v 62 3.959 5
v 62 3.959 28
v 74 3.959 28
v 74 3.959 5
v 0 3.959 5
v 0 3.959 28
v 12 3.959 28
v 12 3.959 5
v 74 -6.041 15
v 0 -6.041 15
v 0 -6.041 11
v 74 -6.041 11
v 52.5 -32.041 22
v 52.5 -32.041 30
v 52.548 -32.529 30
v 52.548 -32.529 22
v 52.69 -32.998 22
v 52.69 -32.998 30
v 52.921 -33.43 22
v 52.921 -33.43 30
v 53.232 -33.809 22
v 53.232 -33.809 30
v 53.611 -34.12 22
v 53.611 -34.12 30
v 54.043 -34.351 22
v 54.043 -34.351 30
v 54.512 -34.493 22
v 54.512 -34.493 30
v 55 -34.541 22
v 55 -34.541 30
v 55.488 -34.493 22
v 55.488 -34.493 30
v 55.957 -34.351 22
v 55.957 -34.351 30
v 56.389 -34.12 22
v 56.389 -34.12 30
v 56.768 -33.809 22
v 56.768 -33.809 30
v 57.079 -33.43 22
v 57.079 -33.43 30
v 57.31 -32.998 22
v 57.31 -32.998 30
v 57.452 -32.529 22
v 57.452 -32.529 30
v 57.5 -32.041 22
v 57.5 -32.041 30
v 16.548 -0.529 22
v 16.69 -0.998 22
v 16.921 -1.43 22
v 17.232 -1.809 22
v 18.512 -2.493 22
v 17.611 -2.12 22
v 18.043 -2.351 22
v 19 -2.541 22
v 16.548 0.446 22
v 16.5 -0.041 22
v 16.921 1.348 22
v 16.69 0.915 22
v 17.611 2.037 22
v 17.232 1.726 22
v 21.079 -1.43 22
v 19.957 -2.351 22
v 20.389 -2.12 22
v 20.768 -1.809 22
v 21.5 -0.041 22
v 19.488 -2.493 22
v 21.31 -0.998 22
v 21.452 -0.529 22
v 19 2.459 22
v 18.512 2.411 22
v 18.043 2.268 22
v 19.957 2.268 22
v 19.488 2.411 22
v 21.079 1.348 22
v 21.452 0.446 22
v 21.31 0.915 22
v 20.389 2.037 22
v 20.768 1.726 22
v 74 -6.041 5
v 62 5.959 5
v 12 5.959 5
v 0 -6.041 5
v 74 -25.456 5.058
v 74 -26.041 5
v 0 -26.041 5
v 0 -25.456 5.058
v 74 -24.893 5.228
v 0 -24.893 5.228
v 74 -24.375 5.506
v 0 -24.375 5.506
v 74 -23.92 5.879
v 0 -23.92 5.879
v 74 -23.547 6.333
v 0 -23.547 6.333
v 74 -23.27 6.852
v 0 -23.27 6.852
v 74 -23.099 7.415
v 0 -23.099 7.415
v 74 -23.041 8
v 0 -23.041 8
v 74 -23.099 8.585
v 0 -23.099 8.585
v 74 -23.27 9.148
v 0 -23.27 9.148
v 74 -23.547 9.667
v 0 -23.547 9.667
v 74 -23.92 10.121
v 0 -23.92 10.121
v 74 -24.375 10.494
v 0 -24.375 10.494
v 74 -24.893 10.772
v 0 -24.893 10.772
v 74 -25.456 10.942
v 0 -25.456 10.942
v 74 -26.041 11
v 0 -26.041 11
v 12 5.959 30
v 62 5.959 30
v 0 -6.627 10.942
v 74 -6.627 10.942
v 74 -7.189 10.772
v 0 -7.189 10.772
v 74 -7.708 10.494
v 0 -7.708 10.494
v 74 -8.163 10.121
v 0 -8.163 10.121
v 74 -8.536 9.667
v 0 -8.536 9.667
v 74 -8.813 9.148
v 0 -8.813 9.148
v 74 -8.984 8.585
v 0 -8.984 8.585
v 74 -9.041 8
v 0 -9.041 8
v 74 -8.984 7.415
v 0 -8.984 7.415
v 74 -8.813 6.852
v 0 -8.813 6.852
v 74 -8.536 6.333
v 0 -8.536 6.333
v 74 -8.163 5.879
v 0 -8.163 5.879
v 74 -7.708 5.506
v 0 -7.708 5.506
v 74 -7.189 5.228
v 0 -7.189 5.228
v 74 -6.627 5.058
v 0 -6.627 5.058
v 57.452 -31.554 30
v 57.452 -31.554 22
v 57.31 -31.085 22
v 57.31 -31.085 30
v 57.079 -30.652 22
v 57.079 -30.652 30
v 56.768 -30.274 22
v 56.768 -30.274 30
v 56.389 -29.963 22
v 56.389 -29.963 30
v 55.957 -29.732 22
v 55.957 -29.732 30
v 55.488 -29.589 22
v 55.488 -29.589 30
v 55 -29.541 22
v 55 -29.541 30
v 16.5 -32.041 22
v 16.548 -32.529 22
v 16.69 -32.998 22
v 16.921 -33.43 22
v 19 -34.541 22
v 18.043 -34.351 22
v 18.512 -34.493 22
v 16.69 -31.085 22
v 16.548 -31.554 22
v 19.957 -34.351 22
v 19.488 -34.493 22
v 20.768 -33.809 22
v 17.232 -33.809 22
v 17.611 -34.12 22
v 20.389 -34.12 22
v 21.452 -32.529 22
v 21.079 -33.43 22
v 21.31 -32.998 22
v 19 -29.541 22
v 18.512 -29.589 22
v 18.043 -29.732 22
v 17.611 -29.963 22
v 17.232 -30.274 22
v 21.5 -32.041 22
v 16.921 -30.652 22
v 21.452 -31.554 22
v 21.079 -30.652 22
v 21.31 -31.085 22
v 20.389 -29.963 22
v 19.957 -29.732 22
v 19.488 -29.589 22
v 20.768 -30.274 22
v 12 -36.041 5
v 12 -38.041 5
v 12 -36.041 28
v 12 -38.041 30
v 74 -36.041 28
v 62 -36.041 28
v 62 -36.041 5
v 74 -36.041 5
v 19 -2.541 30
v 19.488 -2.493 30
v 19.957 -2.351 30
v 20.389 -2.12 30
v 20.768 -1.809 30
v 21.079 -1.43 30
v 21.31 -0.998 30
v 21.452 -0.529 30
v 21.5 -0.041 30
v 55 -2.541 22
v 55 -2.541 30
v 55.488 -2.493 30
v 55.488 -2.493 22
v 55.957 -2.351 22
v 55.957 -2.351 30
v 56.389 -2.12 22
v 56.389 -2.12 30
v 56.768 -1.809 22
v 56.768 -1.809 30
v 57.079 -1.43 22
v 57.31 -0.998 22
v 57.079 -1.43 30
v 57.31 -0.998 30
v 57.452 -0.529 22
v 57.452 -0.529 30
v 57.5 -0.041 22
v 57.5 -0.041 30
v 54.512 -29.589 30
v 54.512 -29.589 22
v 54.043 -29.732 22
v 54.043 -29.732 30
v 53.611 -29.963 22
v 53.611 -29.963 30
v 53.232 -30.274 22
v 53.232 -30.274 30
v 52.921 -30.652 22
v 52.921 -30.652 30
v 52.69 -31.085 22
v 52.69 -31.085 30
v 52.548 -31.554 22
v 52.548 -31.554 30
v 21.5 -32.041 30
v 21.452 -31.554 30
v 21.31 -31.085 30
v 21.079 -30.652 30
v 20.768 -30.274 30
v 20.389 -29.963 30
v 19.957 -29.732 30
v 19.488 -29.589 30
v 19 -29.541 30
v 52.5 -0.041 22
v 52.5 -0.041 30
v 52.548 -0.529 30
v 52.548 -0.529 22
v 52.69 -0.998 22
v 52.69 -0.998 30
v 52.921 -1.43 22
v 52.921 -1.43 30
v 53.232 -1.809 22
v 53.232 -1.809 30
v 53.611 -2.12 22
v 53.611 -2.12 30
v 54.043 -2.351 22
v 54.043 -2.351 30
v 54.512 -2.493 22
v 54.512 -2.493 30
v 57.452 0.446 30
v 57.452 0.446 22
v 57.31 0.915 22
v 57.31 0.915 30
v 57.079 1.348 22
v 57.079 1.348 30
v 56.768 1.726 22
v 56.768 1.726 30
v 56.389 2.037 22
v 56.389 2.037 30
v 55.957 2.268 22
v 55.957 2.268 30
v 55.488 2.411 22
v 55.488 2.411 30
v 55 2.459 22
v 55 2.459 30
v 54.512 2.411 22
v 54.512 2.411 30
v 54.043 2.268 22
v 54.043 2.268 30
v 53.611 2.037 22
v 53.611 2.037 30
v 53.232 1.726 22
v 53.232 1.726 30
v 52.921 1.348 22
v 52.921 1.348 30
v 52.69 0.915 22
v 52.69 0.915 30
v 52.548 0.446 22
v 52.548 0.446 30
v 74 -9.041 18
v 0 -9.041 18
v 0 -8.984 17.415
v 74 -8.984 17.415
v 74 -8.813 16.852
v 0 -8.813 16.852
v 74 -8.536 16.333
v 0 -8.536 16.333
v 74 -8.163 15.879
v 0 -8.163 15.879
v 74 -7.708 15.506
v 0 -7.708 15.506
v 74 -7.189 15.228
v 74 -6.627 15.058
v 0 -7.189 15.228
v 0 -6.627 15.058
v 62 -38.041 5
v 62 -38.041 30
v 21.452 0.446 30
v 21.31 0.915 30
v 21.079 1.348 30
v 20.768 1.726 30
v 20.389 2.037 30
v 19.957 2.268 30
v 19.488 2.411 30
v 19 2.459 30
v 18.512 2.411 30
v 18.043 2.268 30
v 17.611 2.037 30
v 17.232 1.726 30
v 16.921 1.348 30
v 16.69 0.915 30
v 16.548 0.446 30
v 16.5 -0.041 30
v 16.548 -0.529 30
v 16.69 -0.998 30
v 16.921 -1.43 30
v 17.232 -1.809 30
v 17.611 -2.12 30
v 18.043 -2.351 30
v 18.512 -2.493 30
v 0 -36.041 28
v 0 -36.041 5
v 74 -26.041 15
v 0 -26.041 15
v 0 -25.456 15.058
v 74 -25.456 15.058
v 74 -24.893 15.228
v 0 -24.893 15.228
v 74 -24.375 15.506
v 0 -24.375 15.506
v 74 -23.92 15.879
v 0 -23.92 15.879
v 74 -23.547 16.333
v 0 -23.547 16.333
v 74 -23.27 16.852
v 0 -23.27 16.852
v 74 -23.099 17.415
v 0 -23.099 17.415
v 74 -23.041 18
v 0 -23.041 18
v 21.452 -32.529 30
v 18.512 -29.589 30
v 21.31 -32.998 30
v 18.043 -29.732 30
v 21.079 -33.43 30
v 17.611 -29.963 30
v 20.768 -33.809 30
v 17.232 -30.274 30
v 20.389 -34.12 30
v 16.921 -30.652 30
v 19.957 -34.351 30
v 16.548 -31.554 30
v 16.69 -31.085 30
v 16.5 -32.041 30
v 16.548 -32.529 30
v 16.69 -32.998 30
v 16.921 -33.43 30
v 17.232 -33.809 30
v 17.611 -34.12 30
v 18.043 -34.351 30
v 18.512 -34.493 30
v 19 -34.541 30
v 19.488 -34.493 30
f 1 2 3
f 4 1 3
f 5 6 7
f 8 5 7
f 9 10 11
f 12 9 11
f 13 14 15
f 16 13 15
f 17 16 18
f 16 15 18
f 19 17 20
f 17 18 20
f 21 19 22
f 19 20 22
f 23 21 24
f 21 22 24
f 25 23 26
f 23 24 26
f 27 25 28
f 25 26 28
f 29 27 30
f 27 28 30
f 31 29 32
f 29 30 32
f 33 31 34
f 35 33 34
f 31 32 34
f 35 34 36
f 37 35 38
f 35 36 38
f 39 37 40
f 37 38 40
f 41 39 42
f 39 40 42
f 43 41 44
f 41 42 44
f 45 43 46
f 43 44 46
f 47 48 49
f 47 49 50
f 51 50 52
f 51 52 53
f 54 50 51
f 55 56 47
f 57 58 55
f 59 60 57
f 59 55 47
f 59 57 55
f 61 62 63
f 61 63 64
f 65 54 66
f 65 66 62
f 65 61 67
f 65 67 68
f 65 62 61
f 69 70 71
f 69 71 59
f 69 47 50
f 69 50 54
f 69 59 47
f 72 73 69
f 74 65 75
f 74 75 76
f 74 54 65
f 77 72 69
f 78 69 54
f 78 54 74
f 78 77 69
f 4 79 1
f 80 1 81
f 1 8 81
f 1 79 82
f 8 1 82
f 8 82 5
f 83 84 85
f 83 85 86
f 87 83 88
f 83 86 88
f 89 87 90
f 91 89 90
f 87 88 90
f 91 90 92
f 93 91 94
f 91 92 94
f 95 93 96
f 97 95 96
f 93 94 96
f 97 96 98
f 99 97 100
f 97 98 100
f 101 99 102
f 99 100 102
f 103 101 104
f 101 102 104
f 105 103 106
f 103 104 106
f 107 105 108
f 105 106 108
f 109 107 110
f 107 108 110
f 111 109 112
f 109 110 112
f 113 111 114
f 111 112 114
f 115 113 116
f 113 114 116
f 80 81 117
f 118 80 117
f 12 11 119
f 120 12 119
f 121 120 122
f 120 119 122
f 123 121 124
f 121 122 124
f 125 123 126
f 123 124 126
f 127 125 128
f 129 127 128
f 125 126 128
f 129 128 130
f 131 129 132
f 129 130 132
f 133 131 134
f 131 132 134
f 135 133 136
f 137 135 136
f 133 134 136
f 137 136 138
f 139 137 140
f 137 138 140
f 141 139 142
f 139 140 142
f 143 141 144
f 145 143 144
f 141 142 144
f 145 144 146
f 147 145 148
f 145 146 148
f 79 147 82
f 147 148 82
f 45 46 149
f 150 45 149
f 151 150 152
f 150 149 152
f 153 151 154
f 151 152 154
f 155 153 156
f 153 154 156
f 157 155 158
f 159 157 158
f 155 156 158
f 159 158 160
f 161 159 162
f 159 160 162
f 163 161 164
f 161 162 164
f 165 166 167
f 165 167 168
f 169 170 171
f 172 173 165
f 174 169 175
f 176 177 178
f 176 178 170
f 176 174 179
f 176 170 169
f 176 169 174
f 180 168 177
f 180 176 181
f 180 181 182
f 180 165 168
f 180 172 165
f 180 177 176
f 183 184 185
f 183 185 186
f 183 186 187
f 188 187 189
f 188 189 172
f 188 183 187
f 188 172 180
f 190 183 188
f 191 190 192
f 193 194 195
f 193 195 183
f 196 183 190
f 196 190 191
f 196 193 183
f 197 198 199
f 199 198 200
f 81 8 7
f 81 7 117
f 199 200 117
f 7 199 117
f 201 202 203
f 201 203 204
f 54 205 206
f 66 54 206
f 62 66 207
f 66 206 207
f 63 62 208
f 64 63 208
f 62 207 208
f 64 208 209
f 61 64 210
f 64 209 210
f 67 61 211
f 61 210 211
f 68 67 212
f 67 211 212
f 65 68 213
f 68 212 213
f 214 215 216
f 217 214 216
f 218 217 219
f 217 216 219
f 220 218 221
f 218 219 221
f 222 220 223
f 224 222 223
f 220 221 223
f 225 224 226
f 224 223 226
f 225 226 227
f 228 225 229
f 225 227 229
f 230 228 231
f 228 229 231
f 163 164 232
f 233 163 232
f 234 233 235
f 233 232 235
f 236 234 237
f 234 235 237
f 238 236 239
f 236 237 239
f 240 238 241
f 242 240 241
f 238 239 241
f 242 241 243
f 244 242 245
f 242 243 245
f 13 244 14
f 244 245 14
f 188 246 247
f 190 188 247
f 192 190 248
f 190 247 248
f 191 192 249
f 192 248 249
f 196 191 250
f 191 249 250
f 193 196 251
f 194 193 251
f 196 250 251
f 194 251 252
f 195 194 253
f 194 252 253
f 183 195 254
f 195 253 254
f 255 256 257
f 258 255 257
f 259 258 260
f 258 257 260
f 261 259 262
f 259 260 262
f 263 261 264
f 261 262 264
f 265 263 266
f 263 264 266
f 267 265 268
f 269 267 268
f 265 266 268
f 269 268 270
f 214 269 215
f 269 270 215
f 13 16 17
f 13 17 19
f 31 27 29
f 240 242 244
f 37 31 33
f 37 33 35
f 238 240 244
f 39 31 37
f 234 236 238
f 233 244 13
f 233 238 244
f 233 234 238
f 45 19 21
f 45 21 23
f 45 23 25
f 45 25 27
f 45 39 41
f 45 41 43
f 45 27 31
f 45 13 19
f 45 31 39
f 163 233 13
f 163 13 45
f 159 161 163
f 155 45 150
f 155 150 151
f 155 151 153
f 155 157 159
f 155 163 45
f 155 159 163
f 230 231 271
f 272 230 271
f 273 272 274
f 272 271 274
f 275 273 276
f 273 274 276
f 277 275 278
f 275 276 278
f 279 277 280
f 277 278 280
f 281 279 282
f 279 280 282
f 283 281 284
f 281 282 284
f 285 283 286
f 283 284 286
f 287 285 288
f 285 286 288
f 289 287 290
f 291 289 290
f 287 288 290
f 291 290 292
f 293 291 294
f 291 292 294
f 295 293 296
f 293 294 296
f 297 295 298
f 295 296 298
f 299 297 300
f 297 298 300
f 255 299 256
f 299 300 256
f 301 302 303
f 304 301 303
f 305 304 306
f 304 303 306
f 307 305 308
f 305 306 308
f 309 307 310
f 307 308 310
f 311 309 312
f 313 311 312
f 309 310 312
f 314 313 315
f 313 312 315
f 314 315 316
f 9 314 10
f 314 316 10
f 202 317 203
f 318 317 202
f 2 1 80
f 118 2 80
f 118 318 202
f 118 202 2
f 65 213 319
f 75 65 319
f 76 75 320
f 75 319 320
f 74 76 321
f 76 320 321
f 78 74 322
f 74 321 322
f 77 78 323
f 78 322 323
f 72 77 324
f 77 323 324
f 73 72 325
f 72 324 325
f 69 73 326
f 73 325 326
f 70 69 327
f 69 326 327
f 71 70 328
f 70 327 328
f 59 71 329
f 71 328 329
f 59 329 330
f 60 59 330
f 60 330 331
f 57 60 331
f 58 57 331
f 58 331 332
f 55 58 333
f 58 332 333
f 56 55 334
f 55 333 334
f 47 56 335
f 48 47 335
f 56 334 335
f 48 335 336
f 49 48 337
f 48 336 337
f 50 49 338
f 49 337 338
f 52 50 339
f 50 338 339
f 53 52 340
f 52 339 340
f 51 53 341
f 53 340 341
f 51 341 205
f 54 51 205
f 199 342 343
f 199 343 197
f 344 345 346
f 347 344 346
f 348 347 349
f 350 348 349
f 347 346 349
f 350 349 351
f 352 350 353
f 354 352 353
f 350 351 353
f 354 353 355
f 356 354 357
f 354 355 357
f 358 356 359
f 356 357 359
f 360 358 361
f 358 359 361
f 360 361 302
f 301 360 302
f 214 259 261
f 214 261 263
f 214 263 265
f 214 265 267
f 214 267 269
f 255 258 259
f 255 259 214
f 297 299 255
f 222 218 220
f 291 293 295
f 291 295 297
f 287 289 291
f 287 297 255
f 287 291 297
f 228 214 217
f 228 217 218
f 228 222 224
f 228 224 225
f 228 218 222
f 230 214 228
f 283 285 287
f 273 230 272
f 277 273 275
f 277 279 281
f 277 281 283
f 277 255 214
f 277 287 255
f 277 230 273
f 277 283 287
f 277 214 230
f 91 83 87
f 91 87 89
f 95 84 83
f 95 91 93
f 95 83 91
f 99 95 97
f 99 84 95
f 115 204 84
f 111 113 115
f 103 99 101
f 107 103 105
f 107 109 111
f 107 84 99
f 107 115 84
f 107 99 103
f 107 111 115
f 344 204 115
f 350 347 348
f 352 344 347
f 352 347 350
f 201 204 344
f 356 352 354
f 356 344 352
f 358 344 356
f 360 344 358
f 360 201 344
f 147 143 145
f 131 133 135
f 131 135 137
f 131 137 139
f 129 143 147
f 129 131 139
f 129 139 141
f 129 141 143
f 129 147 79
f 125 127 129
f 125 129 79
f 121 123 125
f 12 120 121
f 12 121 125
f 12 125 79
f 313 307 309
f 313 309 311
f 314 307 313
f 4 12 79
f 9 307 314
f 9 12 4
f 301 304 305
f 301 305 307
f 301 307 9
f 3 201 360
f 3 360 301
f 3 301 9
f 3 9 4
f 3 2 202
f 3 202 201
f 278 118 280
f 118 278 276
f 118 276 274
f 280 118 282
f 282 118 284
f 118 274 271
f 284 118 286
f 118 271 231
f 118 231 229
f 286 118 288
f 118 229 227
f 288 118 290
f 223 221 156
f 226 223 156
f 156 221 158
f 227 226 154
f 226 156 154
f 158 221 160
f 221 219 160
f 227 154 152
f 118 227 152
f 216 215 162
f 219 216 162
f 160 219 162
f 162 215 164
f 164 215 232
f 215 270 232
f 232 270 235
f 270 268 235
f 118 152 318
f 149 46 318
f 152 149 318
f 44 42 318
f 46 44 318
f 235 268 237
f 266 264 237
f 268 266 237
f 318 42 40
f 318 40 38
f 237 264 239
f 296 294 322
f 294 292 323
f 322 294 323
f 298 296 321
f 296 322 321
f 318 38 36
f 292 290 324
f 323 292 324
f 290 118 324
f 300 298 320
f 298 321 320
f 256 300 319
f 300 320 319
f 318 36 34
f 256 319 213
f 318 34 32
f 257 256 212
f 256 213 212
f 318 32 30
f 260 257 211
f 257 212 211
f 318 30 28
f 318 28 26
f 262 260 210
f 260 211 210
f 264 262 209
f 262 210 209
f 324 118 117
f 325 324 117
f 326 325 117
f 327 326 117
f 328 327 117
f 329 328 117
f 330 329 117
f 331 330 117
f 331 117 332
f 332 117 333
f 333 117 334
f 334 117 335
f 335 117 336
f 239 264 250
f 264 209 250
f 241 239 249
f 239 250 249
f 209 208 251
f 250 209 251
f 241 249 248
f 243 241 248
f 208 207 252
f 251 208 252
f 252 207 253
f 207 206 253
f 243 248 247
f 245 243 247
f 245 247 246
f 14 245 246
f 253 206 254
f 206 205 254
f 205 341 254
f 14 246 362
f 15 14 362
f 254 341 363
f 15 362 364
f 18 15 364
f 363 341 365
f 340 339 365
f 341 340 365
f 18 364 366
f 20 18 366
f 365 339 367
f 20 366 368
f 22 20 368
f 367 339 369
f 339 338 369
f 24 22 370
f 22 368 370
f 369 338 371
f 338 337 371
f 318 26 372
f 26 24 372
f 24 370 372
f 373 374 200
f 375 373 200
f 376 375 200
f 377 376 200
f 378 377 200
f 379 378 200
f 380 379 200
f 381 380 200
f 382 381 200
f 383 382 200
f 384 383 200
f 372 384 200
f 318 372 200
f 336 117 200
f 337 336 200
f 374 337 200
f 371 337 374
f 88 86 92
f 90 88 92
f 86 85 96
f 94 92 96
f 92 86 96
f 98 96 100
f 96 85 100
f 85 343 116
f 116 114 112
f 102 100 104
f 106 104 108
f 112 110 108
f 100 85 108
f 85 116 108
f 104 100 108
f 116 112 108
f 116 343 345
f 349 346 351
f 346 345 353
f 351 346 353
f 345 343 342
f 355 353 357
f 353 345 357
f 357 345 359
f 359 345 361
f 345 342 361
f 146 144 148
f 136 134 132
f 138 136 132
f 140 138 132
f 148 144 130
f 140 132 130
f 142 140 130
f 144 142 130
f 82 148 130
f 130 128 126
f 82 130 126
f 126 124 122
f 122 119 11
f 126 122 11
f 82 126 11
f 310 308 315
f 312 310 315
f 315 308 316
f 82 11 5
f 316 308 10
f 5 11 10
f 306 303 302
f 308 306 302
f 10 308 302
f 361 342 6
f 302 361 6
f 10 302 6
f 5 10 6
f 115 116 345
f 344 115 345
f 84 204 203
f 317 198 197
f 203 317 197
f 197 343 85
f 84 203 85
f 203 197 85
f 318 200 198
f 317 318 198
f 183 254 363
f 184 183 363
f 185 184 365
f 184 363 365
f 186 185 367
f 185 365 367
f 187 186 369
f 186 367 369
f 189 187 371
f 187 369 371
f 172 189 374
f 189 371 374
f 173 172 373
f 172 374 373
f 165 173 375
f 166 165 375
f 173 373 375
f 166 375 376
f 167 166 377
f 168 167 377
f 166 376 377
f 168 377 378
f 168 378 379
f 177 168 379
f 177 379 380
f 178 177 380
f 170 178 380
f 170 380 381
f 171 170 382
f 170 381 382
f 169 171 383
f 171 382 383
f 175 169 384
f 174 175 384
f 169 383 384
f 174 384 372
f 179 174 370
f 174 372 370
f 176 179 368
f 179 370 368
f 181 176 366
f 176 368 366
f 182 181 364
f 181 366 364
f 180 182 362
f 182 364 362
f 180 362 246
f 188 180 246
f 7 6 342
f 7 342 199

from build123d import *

# Parameters (mm, degrees)
F1_DEPTH = 74
F2_W     = 12
F2_H     = 44
F3_DEPTH = 2
F4_W     = 12
F4_H     = 2
F5_DEPTH = 25
F7_DEPTH = 8


with BuildPart() as f1:
    # F0 (on Right) → F1 (new body)
    with BuildSketch(Plane.YZ):
        with BuildLine():
            ThreePointArc((-26.041336, 5), (-23.041336, 8), (-26.041336, 11))
            Line((-26.041336, 11), (-26.041336, 15))
            ThreePointArc((-26.041336, 15), (-23.920016, 15.87868), (-23.041336, 18))
            Line((-23.041336, 18), (-9.041336, 18))
            ThreePointArc((-9.041336, 18), (-8.162657, 15.87868), (-6.041336, 15))
            Line((-6.041336, 15), (-6.041336, 11))
            ThreePointArc((-6.041336, 11), (-9.041336, 8), (-6.041336, 5))
            Line((-6.041336, 5), (5.958664, 5))
            Line((5.958664, 5), (5.958664, 30))
            Line((5.958664, 30), (-38.041336, 30))
            Line((-38.041336, 30), (-38.041336, 5))
            Line((-38.041336, 5), (-26.041336, 5))
        make_face()
    extrude(amount=F1_DEPTH)

    # F2 (on face) → F3 (cut)
    with BuildSketch(Plane.XY.offset(30)):
        with Locations((68, -16.041336)):
            Rectangle(F2_W, F2_H)
        with Locations((6, -16.041336)):
            Rectangle(F2_W, F2_H)
    extrude(amount=-F3_DEPTH, mode=Mode.SUBTRACT)

    # F4 (on face) → F5 (cut)
    with BuildSketch(Plane.XY.offset(30)):
        with Locations((6, 4.958664)):
            Rectangle(F4_W, F4_H)
        with Locations((6, -37.041336)):
            Rectangle(F4_W, F4_H)
        with Locations((68, -37.041336)):
            Rectangle(F4_W, F4_H)
        with Locations((68, 4.958664)):
            Rectangle(F4_W, F4_H)
    extrude(amount=-F5_DEPTH, mode=Mode.SUBTRACT)

    # F6 (on face) → F7 (cut)
    with BuildSketch(Plane.XY.offset(30)):
        with BuildLine():
            ThreePointArc((21.5, -0.041336), (17.232233, 1.726431), (19, -2.541336))
            ThreePointArc((19, -2.541336), (20.767767, -1.809103), (21.5, -0.041336))
        make_face()
        with BuildLine():
            ThreePointArc((52.5, -0.041336), (53.232233, -1.809103), (55, -2.541336))
            ThreePointArc((55, -2.541336), (56.767767, -1.809103), (57.5, -0.041336))
            ThreePointArc((57.5, -0.041336), (55, 2.458664), (52.5, -0.041336))
        make_face()
        with BuildLine():
            ThreePointArc((55, -29.541336), (53.232233, -30.273569), (52.5, -32.041336))
            ThreePointArc((52.5, -32.041336), (55, -34.541336), (57.5, -32.041336))
            ThreePointArc((57.5, -32.041336), (56.767767, -30.273569), (55, -29.541336))
        make_face()
        with BuildLine():
            ThreePointArc((19, -29.541336), (17.232233, -33.809103), (21.5, -32.041336))
            ThreePointArc((21.5, -32.041336), (20.767767, -30.273569), (19, -29.541336))
        make_face()
    extrude(amount=-F7_DEPTH, mode=Mode.SUBTRACT)


solid = f1.part
